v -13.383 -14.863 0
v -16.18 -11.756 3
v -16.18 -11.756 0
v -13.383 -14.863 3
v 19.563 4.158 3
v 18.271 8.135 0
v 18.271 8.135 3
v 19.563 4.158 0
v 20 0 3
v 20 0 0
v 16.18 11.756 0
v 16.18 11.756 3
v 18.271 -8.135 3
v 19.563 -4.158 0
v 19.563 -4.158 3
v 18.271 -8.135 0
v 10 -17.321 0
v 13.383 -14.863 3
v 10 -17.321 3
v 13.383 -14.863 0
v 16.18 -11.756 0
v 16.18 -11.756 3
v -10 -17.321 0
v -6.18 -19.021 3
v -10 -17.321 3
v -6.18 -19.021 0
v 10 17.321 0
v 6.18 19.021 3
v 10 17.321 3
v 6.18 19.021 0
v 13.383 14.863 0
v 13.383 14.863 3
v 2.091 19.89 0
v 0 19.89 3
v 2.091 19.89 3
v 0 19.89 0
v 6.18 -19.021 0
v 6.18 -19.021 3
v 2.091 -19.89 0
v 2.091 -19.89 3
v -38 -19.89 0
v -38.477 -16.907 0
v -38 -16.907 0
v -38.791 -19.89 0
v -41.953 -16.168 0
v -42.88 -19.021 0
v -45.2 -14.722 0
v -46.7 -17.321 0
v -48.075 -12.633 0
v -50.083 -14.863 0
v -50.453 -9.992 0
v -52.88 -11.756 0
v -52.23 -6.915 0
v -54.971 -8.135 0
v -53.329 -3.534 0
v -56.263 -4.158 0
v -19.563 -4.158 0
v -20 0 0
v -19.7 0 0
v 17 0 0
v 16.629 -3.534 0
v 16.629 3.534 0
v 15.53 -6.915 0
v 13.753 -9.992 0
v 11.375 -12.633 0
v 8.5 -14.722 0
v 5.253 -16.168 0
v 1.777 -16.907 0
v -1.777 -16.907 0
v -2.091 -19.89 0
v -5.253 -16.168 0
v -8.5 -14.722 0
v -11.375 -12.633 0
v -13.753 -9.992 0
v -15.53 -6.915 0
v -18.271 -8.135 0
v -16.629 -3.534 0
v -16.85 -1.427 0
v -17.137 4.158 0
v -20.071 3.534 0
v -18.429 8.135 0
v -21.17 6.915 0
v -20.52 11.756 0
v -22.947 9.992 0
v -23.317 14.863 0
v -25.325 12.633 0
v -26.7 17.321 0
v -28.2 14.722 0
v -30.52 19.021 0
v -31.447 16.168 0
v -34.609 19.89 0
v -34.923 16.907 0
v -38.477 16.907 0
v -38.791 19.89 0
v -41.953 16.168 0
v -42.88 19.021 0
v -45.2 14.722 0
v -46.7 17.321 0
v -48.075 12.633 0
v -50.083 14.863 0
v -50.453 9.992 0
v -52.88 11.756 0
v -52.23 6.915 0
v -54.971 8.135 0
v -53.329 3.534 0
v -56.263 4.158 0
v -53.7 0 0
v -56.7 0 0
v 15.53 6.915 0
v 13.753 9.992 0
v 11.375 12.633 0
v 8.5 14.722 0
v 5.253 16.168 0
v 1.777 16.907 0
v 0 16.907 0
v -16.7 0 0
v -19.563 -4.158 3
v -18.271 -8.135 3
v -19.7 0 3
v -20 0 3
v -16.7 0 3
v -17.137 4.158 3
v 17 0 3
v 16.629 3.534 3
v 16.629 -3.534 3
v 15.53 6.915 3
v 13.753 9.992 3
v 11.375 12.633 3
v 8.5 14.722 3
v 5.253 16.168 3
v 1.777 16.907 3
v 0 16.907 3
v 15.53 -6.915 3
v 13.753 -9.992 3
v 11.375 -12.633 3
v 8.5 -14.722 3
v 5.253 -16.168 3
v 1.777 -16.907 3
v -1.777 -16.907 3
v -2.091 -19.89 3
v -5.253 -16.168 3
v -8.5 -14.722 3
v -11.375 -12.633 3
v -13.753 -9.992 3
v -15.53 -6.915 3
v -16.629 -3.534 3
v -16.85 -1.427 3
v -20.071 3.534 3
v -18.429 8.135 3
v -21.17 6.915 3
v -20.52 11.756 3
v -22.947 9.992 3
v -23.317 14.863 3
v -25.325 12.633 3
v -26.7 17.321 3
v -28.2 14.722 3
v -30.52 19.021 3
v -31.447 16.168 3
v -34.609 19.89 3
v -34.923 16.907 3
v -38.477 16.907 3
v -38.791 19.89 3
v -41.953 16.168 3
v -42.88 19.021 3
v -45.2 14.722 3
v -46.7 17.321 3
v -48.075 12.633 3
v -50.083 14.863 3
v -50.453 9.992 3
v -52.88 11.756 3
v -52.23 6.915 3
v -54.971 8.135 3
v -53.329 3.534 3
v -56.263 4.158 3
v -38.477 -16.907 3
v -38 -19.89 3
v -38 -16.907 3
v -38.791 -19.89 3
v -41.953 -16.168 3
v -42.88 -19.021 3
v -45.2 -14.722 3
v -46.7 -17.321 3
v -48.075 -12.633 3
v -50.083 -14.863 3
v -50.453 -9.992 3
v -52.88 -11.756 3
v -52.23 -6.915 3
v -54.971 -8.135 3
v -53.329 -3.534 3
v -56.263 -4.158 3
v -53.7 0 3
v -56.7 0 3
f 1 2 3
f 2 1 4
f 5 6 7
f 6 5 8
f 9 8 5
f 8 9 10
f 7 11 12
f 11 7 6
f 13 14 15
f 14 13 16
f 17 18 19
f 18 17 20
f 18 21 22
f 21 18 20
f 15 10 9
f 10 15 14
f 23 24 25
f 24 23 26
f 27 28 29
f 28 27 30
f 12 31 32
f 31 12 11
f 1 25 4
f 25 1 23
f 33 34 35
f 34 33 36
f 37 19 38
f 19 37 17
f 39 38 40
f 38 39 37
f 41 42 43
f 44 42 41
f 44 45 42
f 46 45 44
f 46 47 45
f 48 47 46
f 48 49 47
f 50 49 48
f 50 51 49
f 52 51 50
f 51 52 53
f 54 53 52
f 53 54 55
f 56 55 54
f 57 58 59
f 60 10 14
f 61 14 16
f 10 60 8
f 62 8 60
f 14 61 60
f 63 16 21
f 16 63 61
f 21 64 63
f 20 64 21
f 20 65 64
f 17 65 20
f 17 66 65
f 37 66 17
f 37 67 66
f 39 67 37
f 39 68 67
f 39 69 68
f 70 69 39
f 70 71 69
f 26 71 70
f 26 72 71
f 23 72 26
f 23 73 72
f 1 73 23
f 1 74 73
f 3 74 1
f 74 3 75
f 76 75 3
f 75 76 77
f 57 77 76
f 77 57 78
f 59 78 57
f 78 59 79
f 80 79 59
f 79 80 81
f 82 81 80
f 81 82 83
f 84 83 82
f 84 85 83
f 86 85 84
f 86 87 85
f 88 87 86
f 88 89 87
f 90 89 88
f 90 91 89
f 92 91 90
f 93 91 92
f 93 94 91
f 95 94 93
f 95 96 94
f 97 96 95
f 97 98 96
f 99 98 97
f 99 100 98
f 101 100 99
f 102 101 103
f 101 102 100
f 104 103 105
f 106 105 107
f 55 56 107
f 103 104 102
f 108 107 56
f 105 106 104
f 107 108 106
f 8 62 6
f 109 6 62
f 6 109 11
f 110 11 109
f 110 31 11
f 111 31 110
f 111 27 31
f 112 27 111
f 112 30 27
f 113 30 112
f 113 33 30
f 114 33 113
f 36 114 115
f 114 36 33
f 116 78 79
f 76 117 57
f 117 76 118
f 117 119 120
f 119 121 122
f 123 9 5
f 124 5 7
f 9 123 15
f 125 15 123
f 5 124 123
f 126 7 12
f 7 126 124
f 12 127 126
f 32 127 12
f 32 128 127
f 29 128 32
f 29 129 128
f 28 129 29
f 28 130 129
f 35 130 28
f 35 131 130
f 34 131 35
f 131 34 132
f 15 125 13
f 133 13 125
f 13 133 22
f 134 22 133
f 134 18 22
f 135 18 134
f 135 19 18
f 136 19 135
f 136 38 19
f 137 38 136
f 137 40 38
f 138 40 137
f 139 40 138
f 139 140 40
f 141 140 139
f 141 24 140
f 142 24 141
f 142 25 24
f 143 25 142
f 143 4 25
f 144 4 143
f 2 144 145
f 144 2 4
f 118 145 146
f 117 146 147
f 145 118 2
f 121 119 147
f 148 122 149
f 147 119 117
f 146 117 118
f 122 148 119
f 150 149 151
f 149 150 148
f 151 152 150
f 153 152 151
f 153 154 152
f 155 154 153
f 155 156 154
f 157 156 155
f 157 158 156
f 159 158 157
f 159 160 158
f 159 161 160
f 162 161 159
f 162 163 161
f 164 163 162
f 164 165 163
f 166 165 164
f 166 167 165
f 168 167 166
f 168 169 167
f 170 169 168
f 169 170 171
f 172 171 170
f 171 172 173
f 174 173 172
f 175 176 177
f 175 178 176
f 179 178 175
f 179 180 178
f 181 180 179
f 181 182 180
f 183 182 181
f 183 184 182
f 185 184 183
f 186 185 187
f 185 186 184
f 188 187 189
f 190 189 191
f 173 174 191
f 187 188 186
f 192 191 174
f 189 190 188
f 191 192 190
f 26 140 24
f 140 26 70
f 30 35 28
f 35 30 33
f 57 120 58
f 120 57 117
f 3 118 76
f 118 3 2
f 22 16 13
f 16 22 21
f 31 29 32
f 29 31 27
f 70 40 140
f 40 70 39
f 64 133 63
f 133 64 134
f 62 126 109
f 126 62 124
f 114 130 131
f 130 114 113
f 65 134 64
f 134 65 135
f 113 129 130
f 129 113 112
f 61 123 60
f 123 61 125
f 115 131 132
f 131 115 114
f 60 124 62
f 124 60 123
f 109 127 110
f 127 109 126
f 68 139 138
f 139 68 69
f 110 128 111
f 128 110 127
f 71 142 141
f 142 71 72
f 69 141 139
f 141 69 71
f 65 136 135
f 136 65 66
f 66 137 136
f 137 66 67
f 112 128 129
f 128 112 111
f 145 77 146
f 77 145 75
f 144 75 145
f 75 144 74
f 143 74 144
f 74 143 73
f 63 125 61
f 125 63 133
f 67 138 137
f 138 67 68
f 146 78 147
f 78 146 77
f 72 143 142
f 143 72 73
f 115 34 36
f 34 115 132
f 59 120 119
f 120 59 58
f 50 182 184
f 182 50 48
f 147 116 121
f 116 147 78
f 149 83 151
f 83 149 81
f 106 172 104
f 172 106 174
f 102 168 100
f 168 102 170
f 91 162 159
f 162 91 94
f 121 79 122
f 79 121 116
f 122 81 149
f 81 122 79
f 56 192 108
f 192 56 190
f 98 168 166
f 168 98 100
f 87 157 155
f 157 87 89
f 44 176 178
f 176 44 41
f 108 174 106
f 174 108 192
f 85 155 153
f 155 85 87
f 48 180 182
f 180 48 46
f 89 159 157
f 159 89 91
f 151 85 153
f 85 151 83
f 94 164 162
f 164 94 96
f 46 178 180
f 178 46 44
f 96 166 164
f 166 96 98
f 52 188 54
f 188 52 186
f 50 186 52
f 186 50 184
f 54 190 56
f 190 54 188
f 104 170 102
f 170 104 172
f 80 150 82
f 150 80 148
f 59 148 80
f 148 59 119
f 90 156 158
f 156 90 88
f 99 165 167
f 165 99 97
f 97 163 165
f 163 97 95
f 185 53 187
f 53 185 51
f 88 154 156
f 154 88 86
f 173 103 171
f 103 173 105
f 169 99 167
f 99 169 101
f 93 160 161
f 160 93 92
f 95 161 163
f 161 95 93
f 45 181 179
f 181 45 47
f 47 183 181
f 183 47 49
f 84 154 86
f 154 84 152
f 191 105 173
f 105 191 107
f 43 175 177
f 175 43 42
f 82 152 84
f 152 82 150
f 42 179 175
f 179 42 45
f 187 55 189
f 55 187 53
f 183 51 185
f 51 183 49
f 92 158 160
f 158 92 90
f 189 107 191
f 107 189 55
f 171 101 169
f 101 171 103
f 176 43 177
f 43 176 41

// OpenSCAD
difference(){
cylinder(3,20,20);
cylinder(3,17,17);
translate([-20,0,0])
cube(20);

}







difference(){
translate([-36.7,0,0])
cylinder(3,20,20);
translate([-36.7,0,0])
cylinder(3,17,17);
translate([-38,-20,0])
cube(20);

}
